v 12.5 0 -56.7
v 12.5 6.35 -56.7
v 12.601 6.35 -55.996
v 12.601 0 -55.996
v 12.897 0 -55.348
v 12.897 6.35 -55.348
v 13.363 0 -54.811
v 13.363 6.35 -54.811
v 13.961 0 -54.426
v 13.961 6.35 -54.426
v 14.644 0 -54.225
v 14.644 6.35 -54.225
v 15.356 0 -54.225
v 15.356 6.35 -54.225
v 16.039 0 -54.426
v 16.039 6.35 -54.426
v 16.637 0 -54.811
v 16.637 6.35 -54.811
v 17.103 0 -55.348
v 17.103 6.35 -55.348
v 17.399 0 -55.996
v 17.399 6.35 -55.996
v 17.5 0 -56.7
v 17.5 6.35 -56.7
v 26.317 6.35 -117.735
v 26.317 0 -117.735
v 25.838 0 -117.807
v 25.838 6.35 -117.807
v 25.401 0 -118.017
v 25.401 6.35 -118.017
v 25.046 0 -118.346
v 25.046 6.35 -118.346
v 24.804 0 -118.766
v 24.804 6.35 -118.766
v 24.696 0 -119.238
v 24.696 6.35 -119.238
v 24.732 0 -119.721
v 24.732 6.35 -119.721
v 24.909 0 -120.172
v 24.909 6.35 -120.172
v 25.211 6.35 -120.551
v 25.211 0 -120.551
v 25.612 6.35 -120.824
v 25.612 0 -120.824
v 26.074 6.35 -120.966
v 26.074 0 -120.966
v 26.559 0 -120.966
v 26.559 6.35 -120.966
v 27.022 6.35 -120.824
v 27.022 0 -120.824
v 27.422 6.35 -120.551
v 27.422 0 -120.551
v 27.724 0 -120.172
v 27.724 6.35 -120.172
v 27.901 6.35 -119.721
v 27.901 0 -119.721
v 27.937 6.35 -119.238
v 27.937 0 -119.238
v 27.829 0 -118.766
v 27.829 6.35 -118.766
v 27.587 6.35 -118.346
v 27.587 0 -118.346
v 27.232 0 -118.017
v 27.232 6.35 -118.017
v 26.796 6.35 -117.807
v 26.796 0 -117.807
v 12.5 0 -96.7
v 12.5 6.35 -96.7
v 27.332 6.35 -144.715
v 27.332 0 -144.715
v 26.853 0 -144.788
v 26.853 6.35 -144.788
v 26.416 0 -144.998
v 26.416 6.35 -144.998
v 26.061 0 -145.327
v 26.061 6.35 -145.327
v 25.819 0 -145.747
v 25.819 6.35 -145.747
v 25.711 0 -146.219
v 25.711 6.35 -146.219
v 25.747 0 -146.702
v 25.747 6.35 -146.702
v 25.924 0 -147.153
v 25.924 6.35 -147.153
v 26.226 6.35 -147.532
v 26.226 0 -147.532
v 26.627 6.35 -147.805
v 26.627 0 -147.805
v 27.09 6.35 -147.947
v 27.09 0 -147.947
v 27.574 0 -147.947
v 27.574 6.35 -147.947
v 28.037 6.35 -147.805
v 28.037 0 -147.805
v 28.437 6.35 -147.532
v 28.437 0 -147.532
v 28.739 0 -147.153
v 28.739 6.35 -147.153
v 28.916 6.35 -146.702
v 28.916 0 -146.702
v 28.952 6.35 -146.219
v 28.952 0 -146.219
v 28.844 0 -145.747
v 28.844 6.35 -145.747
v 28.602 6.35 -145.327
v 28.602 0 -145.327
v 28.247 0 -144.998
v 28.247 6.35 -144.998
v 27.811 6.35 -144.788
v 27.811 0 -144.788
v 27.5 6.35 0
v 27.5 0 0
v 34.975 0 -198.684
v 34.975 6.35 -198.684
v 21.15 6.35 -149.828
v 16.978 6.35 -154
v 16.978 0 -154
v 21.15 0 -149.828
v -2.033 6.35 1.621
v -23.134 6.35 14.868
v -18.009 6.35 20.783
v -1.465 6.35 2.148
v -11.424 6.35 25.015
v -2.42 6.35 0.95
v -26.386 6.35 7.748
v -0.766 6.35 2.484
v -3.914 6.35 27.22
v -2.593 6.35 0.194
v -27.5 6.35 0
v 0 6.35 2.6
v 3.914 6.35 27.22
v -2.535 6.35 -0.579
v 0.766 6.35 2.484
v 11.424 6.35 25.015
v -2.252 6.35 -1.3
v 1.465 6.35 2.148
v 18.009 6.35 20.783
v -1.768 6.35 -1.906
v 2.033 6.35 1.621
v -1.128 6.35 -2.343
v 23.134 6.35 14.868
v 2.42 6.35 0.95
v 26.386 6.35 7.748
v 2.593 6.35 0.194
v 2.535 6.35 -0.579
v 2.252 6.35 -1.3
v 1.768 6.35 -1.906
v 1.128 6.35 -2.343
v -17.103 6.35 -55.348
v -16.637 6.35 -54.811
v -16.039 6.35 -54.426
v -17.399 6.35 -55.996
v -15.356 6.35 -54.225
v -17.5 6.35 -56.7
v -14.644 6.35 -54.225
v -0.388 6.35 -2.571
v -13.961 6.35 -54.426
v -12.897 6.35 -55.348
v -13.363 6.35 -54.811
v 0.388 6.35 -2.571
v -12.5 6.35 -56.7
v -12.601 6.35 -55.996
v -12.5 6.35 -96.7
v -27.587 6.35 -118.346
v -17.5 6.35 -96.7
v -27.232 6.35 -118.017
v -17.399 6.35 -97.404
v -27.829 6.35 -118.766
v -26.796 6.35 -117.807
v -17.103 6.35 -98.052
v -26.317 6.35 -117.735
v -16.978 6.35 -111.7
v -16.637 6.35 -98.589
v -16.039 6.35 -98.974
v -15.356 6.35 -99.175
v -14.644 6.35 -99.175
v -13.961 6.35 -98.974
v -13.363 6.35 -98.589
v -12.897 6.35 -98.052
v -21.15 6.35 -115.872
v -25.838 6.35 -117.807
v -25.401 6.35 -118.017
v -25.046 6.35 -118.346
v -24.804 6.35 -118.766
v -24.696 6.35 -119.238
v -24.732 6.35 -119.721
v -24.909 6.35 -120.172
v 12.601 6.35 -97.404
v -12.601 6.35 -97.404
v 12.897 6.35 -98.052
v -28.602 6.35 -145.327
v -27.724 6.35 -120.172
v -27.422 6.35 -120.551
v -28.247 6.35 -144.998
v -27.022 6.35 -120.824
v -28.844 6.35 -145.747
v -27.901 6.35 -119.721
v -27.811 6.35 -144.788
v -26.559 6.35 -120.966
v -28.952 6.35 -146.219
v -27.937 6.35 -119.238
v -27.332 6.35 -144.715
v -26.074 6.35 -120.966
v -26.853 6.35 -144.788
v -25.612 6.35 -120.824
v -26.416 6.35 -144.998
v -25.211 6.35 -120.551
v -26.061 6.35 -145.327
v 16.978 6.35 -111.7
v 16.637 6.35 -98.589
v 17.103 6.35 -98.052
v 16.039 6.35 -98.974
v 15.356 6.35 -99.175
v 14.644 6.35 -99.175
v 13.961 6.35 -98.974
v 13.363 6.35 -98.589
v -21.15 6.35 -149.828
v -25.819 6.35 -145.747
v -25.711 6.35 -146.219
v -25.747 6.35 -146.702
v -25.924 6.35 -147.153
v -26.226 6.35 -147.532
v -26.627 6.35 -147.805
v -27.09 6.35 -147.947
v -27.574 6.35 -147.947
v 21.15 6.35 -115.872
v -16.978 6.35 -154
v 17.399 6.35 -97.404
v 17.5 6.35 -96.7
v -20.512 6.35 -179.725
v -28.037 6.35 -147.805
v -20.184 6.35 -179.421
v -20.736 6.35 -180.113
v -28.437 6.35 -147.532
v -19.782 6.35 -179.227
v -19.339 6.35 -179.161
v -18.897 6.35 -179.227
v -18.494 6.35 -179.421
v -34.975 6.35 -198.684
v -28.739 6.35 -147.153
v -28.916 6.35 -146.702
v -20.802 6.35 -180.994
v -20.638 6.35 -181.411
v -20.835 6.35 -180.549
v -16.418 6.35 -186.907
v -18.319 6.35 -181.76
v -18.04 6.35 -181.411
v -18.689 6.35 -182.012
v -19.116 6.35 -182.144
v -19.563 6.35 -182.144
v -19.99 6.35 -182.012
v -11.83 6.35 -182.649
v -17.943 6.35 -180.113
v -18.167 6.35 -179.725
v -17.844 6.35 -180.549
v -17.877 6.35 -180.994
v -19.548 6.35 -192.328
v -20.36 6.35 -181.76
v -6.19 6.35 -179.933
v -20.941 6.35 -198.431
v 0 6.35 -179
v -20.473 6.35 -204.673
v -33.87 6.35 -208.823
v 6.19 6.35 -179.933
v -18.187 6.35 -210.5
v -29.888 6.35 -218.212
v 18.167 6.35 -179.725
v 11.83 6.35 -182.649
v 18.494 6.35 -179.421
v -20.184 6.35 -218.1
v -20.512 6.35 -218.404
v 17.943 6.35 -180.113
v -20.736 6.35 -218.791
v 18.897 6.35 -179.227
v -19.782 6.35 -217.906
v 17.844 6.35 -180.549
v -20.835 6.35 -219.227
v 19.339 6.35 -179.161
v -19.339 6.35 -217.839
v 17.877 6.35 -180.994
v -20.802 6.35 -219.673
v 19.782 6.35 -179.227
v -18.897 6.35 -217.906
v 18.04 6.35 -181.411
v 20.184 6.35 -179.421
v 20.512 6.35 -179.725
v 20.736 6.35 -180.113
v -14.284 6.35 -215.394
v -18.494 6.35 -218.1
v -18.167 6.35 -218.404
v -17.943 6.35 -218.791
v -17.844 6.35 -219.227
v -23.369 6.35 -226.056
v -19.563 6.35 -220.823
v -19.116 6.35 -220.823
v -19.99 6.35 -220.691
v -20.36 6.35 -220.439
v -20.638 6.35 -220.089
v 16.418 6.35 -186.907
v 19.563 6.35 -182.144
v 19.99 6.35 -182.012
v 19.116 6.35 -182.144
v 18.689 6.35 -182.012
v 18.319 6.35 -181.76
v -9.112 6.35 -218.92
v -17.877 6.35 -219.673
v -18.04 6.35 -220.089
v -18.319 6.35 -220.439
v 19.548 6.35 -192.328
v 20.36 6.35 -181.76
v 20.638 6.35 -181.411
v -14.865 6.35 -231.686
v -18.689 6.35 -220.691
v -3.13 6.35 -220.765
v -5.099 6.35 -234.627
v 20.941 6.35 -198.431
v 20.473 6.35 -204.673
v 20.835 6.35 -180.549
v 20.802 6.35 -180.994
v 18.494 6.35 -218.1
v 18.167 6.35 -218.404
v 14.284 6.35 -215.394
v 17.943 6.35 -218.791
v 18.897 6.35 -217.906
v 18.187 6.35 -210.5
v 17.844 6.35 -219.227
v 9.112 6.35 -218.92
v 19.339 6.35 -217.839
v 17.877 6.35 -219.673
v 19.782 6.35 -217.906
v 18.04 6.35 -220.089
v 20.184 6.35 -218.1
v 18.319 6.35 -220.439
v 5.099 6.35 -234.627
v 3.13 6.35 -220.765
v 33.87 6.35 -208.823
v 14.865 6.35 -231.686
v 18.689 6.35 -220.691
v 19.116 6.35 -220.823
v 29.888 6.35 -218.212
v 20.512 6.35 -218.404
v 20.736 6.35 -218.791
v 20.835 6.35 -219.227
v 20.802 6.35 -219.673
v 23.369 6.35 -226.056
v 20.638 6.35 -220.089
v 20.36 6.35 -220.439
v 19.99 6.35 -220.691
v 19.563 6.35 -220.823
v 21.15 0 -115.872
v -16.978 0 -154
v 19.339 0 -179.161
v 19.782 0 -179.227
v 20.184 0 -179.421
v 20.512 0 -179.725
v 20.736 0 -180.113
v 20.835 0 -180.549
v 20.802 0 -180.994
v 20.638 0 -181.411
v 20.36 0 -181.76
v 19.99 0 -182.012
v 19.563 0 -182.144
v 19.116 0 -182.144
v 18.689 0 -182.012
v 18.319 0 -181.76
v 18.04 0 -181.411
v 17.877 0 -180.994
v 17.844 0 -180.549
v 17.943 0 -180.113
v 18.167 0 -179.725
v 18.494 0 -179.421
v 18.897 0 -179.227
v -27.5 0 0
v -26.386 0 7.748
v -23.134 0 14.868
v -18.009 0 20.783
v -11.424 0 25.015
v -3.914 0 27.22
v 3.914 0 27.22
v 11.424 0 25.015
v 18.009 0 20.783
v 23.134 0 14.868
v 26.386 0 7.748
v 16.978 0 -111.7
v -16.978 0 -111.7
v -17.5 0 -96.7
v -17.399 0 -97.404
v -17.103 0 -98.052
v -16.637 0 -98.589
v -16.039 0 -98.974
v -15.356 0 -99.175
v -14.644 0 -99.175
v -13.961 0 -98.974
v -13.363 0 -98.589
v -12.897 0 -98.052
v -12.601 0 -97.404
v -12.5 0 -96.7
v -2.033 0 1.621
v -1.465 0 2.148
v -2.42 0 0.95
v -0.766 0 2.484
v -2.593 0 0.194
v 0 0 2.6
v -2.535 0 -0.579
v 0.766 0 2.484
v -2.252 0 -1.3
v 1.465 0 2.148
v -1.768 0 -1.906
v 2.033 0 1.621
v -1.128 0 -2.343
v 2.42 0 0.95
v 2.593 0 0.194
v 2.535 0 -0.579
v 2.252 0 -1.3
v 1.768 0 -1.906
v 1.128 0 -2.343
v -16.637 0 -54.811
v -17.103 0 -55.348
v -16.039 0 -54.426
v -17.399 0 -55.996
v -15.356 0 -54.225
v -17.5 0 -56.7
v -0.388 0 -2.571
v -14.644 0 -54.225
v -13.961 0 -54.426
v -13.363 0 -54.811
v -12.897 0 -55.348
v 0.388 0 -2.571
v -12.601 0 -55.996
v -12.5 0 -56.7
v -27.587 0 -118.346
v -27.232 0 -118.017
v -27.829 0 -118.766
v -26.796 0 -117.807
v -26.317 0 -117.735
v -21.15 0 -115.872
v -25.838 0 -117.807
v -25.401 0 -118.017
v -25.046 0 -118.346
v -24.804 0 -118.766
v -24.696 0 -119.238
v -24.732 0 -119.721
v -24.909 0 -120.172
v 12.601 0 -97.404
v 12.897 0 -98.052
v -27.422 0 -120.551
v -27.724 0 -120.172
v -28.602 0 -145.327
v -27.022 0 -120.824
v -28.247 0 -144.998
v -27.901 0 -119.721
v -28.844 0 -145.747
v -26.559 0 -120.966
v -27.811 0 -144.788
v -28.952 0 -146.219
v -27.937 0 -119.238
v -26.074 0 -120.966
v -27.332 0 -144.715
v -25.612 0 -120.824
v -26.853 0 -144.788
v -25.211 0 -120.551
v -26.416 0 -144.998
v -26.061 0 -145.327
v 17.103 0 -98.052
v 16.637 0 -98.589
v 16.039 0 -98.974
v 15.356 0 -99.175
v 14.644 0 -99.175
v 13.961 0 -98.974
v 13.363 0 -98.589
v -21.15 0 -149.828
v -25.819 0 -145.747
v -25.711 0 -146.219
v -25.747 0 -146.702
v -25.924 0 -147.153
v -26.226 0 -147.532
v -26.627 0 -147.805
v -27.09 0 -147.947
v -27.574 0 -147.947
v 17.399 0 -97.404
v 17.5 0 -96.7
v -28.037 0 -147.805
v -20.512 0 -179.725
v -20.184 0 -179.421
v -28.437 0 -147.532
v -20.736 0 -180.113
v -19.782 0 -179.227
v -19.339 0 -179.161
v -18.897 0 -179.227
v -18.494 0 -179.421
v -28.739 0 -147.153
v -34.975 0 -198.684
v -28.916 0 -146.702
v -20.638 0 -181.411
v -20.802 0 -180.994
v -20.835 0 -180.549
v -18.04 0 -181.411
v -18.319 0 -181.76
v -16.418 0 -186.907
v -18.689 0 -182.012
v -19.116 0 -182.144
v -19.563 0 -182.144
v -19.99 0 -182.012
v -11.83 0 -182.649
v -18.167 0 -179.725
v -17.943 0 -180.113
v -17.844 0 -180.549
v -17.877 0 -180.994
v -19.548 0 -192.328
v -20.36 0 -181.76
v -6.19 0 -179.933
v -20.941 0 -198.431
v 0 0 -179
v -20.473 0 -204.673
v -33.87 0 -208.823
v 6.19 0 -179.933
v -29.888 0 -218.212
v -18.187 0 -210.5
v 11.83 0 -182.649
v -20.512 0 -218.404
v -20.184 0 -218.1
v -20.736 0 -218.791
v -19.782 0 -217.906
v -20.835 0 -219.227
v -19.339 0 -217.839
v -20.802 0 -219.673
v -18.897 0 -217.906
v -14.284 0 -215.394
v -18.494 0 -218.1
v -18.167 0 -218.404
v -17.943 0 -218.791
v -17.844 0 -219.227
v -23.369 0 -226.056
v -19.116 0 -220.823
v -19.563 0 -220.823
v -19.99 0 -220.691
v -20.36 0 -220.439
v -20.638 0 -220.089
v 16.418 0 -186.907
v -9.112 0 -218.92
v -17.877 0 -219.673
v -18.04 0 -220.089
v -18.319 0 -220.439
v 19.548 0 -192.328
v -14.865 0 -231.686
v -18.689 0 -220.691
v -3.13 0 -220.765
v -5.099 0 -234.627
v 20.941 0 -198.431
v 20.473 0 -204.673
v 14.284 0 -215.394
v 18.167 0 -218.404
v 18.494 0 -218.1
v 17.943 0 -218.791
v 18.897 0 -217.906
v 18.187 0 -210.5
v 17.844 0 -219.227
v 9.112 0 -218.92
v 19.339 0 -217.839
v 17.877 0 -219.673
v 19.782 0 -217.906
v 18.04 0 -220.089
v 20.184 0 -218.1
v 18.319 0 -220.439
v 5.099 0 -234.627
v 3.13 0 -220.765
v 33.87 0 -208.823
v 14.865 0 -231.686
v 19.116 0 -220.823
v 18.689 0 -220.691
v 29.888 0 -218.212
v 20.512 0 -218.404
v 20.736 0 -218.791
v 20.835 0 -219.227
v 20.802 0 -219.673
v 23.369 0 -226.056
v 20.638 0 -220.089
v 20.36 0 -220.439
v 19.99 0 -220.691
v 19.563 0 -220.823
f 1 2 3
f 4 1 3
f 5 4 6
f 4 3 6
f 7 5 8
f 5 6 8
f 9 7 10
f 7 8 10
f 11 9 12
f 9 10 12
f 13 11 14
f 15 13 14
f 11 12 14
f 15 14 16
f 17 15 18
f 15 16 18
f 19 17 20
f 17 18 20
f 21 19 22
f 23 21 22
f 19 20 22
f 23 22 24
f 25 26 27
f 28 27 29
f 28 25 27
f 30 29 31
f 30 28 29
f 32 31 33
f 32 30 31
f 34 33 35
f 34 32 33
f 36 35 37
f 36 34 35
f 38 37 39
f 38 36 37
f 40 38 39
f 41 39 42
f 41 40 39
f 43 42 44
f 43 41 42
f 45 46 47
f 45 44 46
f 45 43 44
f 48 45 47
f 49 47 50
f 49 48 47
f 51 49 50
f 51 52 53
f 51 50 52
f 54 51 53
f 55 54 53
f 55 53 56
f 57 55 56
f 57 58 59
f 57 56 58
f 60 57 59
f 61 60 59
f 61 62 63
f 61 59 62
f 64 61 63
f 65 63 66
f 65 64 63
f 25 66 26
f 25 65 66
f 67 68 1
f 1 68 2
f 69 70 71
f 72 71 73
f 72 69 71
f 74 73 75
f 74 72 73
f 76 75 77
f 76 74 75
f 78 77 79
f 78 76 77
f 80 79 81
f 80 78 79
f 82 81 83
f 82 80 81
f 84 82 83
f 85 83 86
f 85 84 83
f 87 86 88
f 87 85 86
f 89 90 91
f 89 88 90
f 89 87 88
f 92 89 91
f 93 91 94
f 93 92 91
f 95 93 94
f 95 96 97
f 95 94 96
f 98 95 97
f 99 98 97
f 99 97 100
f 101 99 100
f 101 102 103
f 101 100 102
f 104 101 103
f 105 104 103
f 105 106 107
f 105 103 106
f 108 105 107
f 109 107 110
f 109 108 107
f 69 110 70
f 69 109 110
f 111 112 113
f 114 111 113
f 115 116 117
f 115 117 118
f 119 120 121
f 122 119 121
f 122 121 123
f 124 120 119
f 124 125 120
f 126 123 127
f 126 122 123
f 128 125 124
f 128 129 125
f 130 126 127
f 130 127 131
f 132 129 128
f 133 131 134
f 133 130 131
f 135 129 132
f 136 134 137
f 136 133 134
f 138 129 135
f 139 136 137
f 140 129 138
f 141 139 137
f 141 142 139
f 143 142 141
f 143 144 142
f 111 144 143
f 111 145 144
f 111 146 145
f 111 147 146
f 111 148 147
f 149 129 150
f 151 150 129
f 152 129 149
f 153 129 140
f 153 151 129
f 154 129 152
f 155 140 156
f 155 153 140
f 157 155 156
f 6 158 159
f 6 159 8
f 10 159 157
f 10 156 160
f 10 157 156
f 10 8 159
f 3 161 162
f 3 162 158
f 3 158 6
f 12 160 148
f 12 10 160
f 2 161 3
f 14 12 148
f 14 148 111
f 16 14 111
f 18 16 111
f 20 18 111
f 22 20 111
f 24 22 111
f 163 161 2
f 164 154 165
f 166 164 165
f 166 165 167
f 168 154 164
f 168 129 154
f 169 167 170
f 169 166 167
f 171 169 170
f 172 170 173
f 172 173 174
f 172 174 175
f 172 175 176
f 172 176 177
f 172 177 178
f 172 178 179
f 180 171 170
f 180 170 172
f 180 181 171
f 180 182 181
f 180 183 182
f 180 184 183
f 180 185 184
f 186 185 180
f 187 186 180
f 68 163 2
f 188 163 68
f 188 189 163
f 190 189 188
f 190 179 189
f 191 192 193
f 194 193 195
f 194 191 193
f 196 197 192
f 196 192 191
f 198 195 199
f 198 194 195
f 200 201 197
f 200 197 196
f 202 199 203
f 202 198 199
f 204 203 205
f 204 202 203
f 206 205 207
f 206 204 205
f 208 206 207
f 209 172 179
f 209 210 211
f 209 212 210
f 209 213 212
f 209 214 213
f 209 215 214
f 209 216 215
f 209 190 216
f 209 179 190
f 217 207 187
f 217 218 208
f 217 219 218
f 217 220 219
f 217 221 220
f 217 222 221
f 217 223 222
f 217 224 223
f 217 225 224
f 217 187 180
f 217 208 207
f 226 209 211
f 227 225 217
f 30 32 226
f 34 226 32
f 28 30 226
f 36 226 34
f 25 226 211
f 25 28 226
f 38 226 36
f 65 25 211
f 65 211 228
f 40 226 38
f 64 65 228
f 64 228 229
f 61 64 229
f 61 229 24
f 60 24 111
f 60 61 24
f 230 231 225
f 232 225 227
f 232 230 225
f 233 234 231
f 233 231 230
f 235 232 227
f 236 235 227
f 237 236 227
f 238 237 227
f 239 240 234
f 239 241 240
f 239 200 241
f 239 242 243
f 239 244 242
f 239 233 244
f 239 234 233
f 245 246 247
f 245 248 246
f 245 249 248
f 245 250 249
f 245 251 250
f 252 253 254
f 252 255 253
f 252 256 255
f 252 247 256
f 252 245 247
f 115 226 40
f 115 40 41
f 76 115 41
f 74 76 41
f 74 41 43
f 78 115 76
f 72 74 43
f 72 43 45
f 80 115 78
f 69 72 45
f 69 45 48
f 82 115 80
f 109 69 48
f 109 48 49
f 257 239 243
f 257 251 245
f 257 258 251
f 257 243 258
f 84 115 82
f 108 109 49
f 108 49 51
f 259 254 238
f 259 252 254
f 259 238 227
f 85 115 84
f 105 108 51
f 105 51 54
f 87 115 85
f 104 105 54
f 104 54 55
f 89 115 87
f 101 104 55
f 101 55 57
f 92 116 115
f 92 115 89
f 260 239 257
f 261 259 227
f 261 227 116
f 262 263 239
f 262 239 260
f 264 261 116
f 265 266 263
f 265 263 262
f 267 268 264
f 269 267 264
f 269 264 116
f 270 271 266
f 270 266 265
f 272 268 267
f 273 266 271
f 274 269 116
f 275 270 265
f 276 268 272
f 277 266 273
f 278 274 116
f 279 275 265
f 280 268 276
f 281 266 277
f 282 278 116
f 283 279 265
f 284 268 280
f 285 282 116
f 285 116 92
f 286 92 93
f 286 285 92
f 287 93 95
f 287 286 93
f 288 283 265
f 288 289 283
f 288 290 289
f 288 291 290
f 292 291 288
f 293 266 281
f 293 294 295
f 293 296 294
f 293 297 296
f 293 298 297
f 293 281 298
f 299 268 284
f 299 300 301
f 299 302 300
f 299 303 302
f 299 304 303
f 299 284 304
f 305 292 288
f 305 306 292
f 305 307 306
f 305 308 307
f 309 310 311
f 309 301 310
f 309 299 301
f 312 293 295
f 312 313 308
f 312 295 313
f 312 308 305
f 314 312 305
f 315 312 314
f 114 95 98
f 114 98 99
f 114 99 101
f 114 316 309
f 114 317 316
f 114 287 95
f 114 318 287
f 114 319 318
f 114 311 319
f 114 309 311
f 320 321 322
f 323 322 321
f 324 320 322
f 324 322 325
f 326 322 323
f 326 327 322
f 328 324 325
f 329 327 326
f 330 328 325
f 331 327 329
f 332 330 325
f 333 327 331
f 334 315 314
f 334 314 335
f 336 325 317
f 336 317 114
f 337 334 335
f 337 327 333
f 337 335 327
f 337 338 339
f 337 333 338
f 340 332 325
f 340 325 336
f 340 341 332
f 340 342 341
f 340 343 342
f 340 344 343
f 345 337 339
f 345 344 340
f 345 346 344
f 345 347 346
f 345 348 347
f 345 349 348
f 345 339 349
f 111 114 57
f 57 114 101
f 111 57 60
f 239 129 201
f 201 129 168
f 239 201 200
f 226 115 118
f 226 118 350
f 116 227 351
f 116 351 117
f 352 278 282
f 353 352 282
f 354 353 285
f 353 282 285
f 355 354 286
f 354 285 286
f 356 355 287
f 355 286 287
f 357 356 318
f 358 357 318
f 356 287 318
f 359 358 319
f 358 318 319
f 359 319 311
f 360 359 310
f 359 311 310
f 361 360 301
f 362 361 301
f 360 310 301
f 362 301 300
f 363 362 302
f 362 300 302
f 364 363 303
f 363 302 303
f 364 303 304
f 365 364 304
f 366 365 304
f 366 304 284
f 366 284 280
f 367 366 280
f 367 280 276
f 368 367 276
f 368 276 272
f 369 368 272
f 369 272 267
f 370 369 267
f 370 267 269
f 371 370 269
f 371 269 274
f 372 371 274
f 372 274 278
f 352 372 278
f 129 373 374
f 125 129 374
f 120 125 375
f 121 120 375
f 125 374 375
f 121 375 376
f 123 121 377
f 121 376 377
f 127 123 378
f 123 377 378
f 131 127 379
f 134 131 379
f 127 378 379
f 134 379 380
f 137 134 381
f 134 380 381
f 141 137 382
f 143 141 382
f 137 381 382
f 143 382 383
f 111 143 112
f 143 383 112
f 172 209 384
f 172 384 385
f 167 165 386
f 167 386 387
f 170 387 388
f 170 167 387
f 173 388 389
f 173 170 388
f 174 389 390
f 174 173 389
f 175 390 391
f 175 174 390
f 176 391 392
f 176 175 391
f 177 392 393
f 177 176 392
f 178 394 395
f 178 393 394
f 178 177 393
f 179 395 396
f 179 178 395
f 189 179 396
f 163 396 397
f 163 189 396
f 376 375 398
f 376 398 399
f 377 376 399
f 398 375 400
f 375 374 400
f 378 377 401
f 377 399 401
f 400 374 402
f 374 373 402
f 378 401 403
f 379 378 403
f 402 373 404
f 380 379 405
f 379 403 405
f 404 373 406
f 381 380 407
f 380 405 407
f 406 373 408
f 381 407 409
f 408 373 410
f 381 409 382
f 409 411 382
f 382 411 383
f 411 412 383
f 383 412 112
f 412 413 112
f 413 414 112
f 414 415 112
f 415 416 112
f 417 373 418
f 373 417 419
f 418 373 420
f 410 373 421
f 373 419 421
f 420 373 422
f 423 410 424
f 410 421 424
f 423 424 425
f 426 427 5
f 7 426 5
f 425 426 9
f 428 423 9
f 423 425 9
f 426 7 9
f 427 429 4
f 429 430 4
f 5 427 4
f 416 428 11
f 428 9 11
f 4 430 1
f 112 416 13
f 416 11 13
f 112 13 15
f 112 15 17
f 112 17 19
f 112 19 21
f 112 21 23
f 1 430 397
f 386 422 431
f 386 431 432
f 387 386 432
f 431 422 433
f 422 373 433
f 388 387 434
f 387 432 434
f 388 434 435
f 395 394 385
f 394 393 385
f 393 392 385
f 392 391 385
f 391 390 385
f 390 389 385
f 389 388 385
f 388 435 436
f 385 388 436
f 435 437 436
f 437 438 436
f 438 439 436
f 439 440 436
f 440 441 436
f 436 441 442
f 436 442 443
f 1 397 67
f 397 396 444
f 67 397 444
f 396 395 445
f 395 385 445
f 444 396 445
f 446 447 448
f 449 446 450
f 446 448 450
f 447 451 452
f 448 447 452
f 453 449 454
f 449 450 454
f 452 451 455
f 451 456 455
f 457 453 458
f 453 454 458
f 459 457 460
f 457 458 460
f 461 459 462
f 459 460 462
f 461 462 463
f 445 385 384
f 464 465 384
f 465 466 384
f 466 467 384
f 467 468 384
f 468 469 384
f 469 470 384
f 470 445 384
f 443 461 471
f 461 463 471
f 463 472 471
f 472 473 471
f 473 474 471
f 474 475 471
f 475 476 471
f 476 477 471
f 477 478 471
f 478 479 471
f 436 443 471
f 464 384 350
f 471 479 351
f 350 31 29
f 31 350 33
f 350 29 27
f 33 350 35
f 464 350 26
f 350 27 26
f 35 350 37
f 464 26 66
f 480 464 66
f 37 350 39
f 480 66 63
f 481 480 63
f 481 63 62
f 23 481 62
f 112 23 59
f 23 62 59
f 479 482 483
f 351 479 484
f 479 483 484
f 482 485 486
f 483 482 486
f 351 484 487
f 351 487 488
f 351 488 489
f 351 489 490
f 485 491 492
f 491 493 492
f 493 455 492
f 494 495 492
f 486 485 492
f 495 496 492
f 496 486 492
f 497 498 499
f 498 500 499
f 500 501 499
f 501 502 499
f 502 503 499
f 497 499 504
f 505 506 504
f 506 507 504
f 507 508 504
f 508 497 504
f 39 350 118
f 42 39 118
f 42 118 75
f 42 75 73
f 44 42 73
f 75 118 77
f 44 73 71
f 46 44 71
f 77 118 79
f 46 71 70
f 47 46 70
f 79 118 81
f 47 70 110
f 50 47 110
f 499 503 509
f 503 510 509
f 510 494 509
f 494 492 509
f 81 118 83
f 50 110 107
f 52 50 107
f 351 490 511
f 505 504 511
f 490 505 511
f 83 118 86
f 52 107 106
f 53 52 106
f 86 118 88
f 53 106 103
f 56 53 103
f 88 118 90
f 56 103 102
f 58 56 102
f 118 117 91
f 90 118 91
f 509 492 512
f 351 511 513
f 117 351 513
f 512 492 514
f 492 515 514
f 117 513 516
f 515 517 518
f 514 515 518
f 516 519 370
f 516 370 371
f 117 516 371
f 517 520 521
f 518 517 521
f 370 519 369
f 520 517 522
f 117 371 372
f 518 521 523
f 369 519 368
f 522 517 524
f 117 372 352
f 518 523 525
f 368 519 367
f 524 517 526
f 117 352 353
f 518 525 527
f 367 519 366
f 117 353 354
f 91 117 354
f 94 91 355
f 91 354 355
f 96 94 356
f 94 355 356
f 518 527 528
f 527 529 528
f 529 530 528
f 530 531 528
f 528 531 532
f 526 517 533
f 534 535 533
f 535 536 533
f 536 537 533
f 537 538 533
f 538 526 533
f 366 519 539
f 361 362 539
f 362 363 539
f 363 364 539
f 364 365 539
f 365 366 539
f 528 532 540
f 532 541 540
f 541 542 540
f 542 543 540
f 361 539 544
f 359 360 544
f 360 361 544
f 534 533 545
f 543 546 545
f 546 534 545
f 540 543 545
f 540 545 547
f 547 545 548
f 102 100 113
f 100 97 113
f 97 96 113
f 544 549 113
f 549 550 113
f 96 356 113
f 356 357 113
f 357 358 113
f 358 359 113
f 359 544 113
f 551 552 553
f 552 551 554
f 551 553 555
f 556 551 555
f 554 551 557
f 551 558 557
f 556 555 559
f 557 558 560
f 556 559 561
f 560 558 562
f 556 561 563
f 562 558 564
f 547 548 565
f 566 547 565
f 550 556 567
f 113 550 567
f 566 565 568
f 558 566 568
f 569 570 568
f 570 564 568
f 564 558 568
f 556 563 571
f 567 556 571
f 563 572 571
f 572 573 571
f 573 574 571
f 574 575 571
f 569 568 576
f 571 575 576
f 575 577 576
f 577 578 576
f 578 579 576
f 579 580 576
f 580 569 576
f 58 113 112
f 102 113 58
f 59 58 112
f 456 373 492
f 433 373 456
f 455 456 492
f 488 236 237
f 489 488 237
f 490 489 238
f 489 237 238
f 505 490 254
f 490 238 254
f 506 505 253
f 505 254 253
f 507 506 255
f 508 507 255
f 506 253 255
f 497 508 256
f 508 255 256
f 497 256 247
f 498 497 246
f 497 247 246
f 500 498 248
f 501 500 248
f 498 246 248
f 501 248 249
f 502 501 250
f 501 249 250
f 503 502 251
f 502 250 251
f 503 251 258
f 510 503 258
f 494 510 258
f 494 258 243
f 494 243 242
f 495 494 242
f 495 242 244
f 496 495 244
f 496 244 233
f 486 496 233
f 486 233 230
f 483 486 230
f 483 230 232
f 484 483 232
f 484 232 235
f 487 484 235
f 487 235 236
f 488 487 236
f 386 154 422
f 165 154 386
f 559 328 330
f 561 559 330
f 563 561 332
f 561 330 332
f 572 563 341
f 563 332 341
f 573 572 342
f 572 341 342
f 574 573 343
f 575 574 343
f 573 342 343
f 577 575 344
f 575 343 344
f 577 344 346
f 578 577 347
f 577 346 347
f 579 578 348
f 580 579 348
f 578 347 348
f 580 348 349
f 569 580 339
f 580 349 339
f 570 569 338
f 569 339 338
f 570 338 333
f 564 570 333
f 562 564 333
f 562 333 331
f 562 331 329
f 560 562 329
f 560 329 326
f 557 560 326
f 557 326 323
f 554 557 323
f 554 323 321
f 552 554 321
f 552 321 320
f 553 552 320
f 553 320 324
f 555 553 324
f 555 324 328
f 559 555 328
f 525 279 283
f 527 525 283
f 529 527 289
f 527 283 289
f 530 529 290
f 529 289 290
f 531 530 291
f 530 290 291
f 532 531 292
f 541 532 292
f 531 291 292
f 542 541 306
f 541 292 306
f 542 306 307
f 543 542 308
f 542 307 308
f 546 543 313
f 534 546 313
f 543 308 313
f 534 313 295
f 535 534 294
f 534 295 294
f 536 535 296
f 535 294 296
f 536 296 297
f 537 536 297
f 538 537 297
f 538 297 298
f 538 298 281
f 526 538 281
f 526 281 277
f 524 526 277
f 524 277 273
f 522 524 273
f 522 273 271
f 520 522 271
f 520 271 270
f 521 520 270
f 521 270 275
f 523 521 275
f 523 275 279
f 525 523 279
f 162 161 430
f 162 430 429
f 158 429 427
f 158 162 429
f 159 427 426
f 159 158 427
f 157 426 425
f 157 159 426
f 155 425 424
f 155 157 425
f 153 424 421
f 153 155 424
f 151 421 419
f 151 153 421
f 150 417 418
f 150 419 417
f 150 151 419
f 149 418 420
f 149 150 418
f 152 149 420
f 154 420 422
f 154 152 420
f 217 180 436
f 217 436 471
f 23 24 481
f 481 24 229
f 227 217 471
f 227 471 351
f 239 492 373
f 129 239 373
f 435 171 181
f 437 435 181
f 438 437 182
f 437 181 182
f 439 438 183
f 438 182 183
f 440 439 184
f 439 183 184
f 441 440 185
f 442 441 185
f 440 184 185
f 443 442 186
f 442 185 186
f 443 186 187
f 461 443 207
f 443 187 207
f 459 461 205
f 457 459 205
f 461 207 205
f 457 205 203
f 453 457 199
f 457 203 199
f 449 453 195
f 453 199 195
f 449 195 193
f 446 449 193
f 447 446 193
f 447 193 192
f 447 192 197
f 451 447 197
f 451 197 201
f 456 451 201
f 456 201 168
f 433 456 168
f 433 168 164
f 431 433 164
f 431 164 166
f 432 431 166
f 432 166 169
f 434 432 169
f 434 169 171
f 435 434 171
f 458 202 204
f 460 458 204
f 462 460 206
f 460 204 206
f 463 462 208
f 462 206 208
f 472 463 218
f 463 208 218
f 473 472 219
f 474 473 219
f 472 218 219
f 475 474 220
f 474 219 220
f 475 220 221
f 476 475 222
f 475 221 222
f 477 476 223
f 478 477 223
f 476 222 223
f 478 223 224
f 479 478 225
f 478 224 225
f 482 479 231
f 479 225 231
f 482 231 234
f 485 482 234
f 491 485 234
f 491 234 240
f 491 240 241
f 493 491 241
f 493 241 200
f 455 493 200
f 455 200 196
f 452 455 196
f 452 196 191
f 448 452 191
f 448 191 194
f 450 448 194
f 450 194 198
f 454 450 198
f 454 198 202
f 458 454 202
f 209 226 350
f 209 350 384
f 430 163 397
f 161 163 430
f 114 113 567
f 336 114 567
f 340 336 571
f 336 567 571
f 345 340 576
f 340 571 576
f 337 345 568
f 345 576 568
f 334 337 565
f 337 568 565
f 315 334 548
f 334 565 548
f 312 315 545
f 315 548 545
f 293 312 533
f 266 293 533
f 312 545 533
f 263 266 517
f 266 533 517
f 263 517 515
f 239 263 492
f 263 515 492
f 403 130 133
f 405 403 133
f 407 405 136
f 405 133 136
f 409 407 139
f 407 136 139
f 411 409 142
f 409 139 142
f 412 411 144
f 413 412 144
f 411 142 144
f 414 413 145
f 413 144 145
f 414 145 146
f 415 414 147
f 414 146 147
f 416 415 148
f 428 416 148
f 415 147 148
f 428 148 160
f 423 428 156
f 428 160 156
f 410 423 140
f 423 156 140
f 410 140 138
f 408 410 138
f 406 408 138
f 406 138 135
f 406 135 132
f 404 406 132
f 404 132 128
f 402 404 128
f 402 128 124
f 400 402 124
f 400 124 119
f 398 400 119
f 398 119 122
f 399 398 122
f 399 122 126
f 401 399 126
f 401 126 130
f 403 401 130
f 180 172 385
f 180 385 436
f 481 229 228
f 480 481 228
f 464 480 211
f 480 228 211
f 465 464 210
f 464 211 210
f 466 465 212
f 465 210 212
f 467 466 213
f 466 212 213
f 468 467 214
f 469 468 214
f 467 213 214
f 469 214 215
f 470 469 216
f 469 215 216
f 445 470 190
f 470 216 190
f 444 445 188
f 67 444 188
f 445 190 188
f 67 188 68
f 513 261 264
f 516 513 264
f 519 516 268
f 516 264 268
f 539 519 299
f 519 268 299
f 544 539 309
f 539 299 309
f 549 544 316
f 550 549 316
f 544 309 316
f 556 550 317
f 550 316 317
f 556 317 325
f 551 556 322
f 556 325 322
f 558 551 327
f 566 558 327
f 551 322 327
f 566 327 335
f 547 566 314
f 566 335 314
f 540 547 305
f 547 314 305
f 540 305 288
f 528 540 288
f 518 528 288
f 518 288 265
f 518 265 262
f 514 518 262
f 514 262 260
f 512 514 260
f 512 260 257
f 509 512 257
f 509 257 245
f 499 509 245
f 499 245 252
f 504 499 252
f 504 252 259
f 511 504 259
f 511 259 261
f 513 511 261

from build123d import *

# Parameters (mm, degrees)
BOSS_EXTRUDE1_DEPTH     = 6.35
SKETCH2_R               = 2.6
CUT_EXTRUDE1_DEPTH      = 238.676928834
ESQUISSE3_R             = 21
ENL_V_MAT_EXTRU_2_DEPTH = 238.676928834
ESQUISSE7_R             = 1.5
ENL_V_MAT_EXTRU_3_DEPTH = 238.676928834
CUT_EXTRUDE2_DEPTH      = 238.676928834
SKETCH5_R               = 1.625
CUT_EXTRUDE3_DEPTH      = 238.676928834
CUT_EXTRUDE5_DEPTH      = 238.676928834


with BuildPart() as part:
    # Sketch1 → Boss-Extrude1 (new body)
    with BuildSketch(Plane(origin=(0, 0, 0), x_dir=(1, 0, 0), z_dir=(0, 1, 0))):
        with BuildLine():
            Line((27.5, 0), (34.975254116, 198.684097441))
            ThreePointArc((34.975254116, 198.684097441), (0, 235), (-34.975254116, 198.684097441))
            Line((-34.975254116, 198.684097441), (-27.5, 0))
            ThreePointArc((-27.5, 0), (0, -27.5), (27.5, 0))
        make_face()
    extrude(amount=BOSS_EXTRUDE1_DEPTH)

    # Sketch2 → Cut-Extrude1 (cut, through all)
    with BuildSketch(Plane(origin=(0, 6.35, 0), x_dir=(1, 0, 0), z_dir=(0, 1, 0))):
        with Locations(Location((0, 0, 0), (0, 0, 270))):
            Circle(SKETCH2_R)
    extrude(amount=-CUT_EXTRUDE1_DEPTH, mode=Mode.SUBTRACT)

    # Esquisse3 → Enlèv. mat.-Extru.2 (cut, through all)
    with BuildSketch(Plane(origin=(0, 6.35, 0), x_dir=(1, 0, 0), z_dir=(0, 1, 0))):
        with Locations(Location((0, 200, 0), (0, 0, 270))):
            Circle(ESQUISSE3_R)
    extrude(amount=-ENL_V_MAT_EXTRU_2_DEPTH, mode=Mode.SUBTRACT)

    # Esquisse7 → Enlèv. mat.-Extru.3 (cut, through all)
    with BuildSketch(Plane(origin=(0, 6.35, 0), x_dir=(1, 0, 0), z_dir=(0, 1, 0))):
        with Locations(Location((-19.339370465, 219.339370465, 0), (0, 0, 270))):
            Circle(ESQUISSE7_R)
        with Locations(Location((19.339370465, 219.339370465, 0), (0, 0, 270))):
            Circle(ESQUISSE7_R)
        with Locations(Location((19.339370465, 180.660629535, 0), (0, 0, 270))):
            Circle(ESQUISSE7_R)
        with Locations(Location((-19.339370465, 180.660629535, 0), (0, 0, 270))):
            Circle(ESQUISSE7_R)
    extrude(amount=-ENL_V_MAT_EXTRU_3_DEPTH, mode=Mode.SUBTRACT)

    # Sketch3 → Cut-Extrude2 (cut, through all)
    with BuildSketch(Plane(origin=(0, 6.35, 0), x_dir=(1, 0, 0), z_dir=(0, 1, 0))):
        Polygon((21.15, 149.828069991), (21.15, 115.871930009), (16.978069991, 111.7), (-16.978069991, 111.7), (-21.15, 115.871930009), (-21.15, 149.828069991), (-16.978069991, 154), (16.978069991, 154), align=None)
    extrude(amount=-CUT_EXTRUDE2_DEPTH, mode=Mode.SUBTRACT)

    # Sketch5 → Cut-Extrude3 (cut, through all)
    with BuildSketch(Plane(origin=(0, 6.35, 0), x_dir=(1, 0, 0), z_dir=(0, 1, 0))):
        with Locations(Location((-27.331724457, 146.340455159, 0), (0, 0, 270))):
            Circle(SKETCH5_R)
        with Locations(Location((-26.316599626, 119.359544841, 0), (0, 0, 270))):
            Circle(SKETCH5_R)
    cut_extrude3 = extrude(amount=-CUT_EXTRUDE3_DEPTH, mode=Mode.SUBTRACT)

    # Mirror1: Cut-Extrude3 across plane
    add(cut_extrude3.mirror(Plane(origin=(0, 0, 0), x_dir=(0, 0, 1), z_dir=(1, 0, 0))), mode=Mode.SUBTRACT)

    # Sketch8 → Cut-Extrude5 (cut, through all)
    with BuildSketch(Plane(origin=(0, 6.35, 0), x_dir=(1, 0, 0), z_dir=(0, 1, 0))):
        with BuildLine():
            Line((-12.5, 96.7), (-12.5, 56.7))
            ThreePointArc((-12.5, 56.7), (-15, 54.2), (-17.5, 56.7))
            Line((-17.5, 56.7), (-17.5, 96.7))
            ThreePointArc((-17.5, 96.7), (-15, 99.2), (-12.5, 96.7))
        make_face()
    cut_extrude5 = extrude(amount=-CUT_EXTRUDE5_DEPTH, mode=Mode.SUBTRACT)

    # Mirror2: Cut-Extrude5 across plane
    add(cut_extrude5.mirror(Plane(origin=(0, 0, 0), x_dir=(0, 0, 1), z_dir=(1, 0, 0))), mode=Mode.SUBTRACT)


solid = part.part
